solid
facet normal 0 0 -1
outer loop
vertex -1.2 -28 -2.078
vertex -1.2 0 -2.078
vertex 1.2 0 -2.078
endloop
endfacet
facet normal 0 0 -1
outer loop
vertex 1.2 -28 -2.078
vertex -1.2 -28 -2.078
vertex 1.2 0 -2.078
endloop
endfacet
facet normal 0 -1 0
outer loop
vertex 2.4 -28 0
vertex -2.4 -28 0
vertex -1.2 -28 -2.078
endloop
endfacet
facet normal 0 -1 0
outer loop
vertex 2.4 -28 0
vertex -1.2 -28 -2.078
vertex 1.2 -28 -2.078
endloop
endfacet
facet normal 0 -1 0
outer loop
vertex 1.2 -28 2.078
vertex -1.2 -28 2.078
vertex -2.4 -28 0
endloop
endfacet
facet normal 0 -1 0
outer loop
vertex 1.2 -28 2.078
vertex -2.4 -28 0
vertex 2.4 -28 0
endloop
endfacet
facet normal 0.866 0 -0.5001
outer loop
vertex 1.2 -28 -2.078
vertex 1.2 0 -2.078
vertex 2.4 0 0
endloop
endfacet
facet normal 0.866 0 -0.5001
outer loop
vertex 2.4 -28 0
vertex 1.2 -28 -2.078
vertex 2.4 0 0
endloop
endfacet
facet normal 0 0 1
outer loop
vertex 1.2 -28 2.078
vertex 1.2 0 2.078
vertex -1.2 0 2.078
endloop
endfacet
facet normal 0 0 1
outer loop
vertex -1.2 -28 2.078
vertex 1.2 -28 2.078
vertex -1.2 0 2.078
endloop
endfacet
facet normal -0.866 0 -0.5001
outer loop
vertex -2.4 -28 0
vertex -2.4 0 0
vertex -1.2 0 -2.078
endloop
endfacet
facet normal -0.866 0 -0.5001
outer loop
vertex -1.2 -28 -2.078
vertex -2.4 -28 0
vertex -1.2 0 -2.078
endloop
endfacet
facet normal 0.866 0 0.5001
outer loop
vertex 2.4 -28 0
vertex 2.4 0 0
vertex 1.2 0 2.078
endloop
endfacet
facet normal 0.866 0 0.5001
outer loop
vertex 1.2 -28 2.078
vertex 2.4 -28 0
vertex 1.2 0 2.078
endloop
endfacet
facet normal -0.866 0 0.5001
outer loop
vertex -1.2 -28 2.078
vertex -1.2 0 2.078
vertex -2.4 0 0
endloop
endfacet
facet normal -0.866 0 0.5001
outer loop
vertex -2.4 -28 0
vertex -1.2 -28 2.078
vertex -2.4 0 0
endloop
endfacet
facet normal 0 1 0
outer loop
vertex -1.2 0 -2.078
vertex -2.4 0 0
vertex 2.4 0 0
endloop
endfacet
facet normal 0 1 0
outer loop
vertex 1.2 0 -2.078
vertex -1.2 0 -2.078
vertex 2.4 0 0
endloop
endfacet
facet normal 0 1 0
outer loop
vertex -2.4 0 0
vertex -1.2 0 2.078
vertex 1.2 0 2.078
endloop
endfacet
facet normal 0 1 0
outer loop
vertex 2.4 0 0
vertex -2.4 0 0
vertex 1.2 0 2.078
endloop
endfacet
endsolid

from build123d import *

# Parameters (mm, degrees)
F1_DEPTH = 28
F4_DEPTH = 28


with BuildPart() as f1:
    # F0 (on Front) → F1 (new body)
    with BuildSketch(Plane.XZ):
        Polygon((6.646589714, 11.5122310817), (-6.646589714, 11.5122310817), (-13.293179428, 0), (-6.646589714, -11.5122310817), (6.646589714, -11.5122310817), (13.293179428, 0), align=None)
    extrude(amount=F1_DEPTH)


with BuildPart() as f4:
    # F3 (on Front) → F4 (new body)
    with BuildSketch(Plane.XZ):
        Polygon((1.2, 2.0784609691), (-1.2, 2.0784609691), (-2.4, 0), (-1.2, -2.0784609691), (1.2, -2.0784609691), (2.4, 0), align=None)
    extrude(amount=F4_DEPTH)


solid = f4.part
